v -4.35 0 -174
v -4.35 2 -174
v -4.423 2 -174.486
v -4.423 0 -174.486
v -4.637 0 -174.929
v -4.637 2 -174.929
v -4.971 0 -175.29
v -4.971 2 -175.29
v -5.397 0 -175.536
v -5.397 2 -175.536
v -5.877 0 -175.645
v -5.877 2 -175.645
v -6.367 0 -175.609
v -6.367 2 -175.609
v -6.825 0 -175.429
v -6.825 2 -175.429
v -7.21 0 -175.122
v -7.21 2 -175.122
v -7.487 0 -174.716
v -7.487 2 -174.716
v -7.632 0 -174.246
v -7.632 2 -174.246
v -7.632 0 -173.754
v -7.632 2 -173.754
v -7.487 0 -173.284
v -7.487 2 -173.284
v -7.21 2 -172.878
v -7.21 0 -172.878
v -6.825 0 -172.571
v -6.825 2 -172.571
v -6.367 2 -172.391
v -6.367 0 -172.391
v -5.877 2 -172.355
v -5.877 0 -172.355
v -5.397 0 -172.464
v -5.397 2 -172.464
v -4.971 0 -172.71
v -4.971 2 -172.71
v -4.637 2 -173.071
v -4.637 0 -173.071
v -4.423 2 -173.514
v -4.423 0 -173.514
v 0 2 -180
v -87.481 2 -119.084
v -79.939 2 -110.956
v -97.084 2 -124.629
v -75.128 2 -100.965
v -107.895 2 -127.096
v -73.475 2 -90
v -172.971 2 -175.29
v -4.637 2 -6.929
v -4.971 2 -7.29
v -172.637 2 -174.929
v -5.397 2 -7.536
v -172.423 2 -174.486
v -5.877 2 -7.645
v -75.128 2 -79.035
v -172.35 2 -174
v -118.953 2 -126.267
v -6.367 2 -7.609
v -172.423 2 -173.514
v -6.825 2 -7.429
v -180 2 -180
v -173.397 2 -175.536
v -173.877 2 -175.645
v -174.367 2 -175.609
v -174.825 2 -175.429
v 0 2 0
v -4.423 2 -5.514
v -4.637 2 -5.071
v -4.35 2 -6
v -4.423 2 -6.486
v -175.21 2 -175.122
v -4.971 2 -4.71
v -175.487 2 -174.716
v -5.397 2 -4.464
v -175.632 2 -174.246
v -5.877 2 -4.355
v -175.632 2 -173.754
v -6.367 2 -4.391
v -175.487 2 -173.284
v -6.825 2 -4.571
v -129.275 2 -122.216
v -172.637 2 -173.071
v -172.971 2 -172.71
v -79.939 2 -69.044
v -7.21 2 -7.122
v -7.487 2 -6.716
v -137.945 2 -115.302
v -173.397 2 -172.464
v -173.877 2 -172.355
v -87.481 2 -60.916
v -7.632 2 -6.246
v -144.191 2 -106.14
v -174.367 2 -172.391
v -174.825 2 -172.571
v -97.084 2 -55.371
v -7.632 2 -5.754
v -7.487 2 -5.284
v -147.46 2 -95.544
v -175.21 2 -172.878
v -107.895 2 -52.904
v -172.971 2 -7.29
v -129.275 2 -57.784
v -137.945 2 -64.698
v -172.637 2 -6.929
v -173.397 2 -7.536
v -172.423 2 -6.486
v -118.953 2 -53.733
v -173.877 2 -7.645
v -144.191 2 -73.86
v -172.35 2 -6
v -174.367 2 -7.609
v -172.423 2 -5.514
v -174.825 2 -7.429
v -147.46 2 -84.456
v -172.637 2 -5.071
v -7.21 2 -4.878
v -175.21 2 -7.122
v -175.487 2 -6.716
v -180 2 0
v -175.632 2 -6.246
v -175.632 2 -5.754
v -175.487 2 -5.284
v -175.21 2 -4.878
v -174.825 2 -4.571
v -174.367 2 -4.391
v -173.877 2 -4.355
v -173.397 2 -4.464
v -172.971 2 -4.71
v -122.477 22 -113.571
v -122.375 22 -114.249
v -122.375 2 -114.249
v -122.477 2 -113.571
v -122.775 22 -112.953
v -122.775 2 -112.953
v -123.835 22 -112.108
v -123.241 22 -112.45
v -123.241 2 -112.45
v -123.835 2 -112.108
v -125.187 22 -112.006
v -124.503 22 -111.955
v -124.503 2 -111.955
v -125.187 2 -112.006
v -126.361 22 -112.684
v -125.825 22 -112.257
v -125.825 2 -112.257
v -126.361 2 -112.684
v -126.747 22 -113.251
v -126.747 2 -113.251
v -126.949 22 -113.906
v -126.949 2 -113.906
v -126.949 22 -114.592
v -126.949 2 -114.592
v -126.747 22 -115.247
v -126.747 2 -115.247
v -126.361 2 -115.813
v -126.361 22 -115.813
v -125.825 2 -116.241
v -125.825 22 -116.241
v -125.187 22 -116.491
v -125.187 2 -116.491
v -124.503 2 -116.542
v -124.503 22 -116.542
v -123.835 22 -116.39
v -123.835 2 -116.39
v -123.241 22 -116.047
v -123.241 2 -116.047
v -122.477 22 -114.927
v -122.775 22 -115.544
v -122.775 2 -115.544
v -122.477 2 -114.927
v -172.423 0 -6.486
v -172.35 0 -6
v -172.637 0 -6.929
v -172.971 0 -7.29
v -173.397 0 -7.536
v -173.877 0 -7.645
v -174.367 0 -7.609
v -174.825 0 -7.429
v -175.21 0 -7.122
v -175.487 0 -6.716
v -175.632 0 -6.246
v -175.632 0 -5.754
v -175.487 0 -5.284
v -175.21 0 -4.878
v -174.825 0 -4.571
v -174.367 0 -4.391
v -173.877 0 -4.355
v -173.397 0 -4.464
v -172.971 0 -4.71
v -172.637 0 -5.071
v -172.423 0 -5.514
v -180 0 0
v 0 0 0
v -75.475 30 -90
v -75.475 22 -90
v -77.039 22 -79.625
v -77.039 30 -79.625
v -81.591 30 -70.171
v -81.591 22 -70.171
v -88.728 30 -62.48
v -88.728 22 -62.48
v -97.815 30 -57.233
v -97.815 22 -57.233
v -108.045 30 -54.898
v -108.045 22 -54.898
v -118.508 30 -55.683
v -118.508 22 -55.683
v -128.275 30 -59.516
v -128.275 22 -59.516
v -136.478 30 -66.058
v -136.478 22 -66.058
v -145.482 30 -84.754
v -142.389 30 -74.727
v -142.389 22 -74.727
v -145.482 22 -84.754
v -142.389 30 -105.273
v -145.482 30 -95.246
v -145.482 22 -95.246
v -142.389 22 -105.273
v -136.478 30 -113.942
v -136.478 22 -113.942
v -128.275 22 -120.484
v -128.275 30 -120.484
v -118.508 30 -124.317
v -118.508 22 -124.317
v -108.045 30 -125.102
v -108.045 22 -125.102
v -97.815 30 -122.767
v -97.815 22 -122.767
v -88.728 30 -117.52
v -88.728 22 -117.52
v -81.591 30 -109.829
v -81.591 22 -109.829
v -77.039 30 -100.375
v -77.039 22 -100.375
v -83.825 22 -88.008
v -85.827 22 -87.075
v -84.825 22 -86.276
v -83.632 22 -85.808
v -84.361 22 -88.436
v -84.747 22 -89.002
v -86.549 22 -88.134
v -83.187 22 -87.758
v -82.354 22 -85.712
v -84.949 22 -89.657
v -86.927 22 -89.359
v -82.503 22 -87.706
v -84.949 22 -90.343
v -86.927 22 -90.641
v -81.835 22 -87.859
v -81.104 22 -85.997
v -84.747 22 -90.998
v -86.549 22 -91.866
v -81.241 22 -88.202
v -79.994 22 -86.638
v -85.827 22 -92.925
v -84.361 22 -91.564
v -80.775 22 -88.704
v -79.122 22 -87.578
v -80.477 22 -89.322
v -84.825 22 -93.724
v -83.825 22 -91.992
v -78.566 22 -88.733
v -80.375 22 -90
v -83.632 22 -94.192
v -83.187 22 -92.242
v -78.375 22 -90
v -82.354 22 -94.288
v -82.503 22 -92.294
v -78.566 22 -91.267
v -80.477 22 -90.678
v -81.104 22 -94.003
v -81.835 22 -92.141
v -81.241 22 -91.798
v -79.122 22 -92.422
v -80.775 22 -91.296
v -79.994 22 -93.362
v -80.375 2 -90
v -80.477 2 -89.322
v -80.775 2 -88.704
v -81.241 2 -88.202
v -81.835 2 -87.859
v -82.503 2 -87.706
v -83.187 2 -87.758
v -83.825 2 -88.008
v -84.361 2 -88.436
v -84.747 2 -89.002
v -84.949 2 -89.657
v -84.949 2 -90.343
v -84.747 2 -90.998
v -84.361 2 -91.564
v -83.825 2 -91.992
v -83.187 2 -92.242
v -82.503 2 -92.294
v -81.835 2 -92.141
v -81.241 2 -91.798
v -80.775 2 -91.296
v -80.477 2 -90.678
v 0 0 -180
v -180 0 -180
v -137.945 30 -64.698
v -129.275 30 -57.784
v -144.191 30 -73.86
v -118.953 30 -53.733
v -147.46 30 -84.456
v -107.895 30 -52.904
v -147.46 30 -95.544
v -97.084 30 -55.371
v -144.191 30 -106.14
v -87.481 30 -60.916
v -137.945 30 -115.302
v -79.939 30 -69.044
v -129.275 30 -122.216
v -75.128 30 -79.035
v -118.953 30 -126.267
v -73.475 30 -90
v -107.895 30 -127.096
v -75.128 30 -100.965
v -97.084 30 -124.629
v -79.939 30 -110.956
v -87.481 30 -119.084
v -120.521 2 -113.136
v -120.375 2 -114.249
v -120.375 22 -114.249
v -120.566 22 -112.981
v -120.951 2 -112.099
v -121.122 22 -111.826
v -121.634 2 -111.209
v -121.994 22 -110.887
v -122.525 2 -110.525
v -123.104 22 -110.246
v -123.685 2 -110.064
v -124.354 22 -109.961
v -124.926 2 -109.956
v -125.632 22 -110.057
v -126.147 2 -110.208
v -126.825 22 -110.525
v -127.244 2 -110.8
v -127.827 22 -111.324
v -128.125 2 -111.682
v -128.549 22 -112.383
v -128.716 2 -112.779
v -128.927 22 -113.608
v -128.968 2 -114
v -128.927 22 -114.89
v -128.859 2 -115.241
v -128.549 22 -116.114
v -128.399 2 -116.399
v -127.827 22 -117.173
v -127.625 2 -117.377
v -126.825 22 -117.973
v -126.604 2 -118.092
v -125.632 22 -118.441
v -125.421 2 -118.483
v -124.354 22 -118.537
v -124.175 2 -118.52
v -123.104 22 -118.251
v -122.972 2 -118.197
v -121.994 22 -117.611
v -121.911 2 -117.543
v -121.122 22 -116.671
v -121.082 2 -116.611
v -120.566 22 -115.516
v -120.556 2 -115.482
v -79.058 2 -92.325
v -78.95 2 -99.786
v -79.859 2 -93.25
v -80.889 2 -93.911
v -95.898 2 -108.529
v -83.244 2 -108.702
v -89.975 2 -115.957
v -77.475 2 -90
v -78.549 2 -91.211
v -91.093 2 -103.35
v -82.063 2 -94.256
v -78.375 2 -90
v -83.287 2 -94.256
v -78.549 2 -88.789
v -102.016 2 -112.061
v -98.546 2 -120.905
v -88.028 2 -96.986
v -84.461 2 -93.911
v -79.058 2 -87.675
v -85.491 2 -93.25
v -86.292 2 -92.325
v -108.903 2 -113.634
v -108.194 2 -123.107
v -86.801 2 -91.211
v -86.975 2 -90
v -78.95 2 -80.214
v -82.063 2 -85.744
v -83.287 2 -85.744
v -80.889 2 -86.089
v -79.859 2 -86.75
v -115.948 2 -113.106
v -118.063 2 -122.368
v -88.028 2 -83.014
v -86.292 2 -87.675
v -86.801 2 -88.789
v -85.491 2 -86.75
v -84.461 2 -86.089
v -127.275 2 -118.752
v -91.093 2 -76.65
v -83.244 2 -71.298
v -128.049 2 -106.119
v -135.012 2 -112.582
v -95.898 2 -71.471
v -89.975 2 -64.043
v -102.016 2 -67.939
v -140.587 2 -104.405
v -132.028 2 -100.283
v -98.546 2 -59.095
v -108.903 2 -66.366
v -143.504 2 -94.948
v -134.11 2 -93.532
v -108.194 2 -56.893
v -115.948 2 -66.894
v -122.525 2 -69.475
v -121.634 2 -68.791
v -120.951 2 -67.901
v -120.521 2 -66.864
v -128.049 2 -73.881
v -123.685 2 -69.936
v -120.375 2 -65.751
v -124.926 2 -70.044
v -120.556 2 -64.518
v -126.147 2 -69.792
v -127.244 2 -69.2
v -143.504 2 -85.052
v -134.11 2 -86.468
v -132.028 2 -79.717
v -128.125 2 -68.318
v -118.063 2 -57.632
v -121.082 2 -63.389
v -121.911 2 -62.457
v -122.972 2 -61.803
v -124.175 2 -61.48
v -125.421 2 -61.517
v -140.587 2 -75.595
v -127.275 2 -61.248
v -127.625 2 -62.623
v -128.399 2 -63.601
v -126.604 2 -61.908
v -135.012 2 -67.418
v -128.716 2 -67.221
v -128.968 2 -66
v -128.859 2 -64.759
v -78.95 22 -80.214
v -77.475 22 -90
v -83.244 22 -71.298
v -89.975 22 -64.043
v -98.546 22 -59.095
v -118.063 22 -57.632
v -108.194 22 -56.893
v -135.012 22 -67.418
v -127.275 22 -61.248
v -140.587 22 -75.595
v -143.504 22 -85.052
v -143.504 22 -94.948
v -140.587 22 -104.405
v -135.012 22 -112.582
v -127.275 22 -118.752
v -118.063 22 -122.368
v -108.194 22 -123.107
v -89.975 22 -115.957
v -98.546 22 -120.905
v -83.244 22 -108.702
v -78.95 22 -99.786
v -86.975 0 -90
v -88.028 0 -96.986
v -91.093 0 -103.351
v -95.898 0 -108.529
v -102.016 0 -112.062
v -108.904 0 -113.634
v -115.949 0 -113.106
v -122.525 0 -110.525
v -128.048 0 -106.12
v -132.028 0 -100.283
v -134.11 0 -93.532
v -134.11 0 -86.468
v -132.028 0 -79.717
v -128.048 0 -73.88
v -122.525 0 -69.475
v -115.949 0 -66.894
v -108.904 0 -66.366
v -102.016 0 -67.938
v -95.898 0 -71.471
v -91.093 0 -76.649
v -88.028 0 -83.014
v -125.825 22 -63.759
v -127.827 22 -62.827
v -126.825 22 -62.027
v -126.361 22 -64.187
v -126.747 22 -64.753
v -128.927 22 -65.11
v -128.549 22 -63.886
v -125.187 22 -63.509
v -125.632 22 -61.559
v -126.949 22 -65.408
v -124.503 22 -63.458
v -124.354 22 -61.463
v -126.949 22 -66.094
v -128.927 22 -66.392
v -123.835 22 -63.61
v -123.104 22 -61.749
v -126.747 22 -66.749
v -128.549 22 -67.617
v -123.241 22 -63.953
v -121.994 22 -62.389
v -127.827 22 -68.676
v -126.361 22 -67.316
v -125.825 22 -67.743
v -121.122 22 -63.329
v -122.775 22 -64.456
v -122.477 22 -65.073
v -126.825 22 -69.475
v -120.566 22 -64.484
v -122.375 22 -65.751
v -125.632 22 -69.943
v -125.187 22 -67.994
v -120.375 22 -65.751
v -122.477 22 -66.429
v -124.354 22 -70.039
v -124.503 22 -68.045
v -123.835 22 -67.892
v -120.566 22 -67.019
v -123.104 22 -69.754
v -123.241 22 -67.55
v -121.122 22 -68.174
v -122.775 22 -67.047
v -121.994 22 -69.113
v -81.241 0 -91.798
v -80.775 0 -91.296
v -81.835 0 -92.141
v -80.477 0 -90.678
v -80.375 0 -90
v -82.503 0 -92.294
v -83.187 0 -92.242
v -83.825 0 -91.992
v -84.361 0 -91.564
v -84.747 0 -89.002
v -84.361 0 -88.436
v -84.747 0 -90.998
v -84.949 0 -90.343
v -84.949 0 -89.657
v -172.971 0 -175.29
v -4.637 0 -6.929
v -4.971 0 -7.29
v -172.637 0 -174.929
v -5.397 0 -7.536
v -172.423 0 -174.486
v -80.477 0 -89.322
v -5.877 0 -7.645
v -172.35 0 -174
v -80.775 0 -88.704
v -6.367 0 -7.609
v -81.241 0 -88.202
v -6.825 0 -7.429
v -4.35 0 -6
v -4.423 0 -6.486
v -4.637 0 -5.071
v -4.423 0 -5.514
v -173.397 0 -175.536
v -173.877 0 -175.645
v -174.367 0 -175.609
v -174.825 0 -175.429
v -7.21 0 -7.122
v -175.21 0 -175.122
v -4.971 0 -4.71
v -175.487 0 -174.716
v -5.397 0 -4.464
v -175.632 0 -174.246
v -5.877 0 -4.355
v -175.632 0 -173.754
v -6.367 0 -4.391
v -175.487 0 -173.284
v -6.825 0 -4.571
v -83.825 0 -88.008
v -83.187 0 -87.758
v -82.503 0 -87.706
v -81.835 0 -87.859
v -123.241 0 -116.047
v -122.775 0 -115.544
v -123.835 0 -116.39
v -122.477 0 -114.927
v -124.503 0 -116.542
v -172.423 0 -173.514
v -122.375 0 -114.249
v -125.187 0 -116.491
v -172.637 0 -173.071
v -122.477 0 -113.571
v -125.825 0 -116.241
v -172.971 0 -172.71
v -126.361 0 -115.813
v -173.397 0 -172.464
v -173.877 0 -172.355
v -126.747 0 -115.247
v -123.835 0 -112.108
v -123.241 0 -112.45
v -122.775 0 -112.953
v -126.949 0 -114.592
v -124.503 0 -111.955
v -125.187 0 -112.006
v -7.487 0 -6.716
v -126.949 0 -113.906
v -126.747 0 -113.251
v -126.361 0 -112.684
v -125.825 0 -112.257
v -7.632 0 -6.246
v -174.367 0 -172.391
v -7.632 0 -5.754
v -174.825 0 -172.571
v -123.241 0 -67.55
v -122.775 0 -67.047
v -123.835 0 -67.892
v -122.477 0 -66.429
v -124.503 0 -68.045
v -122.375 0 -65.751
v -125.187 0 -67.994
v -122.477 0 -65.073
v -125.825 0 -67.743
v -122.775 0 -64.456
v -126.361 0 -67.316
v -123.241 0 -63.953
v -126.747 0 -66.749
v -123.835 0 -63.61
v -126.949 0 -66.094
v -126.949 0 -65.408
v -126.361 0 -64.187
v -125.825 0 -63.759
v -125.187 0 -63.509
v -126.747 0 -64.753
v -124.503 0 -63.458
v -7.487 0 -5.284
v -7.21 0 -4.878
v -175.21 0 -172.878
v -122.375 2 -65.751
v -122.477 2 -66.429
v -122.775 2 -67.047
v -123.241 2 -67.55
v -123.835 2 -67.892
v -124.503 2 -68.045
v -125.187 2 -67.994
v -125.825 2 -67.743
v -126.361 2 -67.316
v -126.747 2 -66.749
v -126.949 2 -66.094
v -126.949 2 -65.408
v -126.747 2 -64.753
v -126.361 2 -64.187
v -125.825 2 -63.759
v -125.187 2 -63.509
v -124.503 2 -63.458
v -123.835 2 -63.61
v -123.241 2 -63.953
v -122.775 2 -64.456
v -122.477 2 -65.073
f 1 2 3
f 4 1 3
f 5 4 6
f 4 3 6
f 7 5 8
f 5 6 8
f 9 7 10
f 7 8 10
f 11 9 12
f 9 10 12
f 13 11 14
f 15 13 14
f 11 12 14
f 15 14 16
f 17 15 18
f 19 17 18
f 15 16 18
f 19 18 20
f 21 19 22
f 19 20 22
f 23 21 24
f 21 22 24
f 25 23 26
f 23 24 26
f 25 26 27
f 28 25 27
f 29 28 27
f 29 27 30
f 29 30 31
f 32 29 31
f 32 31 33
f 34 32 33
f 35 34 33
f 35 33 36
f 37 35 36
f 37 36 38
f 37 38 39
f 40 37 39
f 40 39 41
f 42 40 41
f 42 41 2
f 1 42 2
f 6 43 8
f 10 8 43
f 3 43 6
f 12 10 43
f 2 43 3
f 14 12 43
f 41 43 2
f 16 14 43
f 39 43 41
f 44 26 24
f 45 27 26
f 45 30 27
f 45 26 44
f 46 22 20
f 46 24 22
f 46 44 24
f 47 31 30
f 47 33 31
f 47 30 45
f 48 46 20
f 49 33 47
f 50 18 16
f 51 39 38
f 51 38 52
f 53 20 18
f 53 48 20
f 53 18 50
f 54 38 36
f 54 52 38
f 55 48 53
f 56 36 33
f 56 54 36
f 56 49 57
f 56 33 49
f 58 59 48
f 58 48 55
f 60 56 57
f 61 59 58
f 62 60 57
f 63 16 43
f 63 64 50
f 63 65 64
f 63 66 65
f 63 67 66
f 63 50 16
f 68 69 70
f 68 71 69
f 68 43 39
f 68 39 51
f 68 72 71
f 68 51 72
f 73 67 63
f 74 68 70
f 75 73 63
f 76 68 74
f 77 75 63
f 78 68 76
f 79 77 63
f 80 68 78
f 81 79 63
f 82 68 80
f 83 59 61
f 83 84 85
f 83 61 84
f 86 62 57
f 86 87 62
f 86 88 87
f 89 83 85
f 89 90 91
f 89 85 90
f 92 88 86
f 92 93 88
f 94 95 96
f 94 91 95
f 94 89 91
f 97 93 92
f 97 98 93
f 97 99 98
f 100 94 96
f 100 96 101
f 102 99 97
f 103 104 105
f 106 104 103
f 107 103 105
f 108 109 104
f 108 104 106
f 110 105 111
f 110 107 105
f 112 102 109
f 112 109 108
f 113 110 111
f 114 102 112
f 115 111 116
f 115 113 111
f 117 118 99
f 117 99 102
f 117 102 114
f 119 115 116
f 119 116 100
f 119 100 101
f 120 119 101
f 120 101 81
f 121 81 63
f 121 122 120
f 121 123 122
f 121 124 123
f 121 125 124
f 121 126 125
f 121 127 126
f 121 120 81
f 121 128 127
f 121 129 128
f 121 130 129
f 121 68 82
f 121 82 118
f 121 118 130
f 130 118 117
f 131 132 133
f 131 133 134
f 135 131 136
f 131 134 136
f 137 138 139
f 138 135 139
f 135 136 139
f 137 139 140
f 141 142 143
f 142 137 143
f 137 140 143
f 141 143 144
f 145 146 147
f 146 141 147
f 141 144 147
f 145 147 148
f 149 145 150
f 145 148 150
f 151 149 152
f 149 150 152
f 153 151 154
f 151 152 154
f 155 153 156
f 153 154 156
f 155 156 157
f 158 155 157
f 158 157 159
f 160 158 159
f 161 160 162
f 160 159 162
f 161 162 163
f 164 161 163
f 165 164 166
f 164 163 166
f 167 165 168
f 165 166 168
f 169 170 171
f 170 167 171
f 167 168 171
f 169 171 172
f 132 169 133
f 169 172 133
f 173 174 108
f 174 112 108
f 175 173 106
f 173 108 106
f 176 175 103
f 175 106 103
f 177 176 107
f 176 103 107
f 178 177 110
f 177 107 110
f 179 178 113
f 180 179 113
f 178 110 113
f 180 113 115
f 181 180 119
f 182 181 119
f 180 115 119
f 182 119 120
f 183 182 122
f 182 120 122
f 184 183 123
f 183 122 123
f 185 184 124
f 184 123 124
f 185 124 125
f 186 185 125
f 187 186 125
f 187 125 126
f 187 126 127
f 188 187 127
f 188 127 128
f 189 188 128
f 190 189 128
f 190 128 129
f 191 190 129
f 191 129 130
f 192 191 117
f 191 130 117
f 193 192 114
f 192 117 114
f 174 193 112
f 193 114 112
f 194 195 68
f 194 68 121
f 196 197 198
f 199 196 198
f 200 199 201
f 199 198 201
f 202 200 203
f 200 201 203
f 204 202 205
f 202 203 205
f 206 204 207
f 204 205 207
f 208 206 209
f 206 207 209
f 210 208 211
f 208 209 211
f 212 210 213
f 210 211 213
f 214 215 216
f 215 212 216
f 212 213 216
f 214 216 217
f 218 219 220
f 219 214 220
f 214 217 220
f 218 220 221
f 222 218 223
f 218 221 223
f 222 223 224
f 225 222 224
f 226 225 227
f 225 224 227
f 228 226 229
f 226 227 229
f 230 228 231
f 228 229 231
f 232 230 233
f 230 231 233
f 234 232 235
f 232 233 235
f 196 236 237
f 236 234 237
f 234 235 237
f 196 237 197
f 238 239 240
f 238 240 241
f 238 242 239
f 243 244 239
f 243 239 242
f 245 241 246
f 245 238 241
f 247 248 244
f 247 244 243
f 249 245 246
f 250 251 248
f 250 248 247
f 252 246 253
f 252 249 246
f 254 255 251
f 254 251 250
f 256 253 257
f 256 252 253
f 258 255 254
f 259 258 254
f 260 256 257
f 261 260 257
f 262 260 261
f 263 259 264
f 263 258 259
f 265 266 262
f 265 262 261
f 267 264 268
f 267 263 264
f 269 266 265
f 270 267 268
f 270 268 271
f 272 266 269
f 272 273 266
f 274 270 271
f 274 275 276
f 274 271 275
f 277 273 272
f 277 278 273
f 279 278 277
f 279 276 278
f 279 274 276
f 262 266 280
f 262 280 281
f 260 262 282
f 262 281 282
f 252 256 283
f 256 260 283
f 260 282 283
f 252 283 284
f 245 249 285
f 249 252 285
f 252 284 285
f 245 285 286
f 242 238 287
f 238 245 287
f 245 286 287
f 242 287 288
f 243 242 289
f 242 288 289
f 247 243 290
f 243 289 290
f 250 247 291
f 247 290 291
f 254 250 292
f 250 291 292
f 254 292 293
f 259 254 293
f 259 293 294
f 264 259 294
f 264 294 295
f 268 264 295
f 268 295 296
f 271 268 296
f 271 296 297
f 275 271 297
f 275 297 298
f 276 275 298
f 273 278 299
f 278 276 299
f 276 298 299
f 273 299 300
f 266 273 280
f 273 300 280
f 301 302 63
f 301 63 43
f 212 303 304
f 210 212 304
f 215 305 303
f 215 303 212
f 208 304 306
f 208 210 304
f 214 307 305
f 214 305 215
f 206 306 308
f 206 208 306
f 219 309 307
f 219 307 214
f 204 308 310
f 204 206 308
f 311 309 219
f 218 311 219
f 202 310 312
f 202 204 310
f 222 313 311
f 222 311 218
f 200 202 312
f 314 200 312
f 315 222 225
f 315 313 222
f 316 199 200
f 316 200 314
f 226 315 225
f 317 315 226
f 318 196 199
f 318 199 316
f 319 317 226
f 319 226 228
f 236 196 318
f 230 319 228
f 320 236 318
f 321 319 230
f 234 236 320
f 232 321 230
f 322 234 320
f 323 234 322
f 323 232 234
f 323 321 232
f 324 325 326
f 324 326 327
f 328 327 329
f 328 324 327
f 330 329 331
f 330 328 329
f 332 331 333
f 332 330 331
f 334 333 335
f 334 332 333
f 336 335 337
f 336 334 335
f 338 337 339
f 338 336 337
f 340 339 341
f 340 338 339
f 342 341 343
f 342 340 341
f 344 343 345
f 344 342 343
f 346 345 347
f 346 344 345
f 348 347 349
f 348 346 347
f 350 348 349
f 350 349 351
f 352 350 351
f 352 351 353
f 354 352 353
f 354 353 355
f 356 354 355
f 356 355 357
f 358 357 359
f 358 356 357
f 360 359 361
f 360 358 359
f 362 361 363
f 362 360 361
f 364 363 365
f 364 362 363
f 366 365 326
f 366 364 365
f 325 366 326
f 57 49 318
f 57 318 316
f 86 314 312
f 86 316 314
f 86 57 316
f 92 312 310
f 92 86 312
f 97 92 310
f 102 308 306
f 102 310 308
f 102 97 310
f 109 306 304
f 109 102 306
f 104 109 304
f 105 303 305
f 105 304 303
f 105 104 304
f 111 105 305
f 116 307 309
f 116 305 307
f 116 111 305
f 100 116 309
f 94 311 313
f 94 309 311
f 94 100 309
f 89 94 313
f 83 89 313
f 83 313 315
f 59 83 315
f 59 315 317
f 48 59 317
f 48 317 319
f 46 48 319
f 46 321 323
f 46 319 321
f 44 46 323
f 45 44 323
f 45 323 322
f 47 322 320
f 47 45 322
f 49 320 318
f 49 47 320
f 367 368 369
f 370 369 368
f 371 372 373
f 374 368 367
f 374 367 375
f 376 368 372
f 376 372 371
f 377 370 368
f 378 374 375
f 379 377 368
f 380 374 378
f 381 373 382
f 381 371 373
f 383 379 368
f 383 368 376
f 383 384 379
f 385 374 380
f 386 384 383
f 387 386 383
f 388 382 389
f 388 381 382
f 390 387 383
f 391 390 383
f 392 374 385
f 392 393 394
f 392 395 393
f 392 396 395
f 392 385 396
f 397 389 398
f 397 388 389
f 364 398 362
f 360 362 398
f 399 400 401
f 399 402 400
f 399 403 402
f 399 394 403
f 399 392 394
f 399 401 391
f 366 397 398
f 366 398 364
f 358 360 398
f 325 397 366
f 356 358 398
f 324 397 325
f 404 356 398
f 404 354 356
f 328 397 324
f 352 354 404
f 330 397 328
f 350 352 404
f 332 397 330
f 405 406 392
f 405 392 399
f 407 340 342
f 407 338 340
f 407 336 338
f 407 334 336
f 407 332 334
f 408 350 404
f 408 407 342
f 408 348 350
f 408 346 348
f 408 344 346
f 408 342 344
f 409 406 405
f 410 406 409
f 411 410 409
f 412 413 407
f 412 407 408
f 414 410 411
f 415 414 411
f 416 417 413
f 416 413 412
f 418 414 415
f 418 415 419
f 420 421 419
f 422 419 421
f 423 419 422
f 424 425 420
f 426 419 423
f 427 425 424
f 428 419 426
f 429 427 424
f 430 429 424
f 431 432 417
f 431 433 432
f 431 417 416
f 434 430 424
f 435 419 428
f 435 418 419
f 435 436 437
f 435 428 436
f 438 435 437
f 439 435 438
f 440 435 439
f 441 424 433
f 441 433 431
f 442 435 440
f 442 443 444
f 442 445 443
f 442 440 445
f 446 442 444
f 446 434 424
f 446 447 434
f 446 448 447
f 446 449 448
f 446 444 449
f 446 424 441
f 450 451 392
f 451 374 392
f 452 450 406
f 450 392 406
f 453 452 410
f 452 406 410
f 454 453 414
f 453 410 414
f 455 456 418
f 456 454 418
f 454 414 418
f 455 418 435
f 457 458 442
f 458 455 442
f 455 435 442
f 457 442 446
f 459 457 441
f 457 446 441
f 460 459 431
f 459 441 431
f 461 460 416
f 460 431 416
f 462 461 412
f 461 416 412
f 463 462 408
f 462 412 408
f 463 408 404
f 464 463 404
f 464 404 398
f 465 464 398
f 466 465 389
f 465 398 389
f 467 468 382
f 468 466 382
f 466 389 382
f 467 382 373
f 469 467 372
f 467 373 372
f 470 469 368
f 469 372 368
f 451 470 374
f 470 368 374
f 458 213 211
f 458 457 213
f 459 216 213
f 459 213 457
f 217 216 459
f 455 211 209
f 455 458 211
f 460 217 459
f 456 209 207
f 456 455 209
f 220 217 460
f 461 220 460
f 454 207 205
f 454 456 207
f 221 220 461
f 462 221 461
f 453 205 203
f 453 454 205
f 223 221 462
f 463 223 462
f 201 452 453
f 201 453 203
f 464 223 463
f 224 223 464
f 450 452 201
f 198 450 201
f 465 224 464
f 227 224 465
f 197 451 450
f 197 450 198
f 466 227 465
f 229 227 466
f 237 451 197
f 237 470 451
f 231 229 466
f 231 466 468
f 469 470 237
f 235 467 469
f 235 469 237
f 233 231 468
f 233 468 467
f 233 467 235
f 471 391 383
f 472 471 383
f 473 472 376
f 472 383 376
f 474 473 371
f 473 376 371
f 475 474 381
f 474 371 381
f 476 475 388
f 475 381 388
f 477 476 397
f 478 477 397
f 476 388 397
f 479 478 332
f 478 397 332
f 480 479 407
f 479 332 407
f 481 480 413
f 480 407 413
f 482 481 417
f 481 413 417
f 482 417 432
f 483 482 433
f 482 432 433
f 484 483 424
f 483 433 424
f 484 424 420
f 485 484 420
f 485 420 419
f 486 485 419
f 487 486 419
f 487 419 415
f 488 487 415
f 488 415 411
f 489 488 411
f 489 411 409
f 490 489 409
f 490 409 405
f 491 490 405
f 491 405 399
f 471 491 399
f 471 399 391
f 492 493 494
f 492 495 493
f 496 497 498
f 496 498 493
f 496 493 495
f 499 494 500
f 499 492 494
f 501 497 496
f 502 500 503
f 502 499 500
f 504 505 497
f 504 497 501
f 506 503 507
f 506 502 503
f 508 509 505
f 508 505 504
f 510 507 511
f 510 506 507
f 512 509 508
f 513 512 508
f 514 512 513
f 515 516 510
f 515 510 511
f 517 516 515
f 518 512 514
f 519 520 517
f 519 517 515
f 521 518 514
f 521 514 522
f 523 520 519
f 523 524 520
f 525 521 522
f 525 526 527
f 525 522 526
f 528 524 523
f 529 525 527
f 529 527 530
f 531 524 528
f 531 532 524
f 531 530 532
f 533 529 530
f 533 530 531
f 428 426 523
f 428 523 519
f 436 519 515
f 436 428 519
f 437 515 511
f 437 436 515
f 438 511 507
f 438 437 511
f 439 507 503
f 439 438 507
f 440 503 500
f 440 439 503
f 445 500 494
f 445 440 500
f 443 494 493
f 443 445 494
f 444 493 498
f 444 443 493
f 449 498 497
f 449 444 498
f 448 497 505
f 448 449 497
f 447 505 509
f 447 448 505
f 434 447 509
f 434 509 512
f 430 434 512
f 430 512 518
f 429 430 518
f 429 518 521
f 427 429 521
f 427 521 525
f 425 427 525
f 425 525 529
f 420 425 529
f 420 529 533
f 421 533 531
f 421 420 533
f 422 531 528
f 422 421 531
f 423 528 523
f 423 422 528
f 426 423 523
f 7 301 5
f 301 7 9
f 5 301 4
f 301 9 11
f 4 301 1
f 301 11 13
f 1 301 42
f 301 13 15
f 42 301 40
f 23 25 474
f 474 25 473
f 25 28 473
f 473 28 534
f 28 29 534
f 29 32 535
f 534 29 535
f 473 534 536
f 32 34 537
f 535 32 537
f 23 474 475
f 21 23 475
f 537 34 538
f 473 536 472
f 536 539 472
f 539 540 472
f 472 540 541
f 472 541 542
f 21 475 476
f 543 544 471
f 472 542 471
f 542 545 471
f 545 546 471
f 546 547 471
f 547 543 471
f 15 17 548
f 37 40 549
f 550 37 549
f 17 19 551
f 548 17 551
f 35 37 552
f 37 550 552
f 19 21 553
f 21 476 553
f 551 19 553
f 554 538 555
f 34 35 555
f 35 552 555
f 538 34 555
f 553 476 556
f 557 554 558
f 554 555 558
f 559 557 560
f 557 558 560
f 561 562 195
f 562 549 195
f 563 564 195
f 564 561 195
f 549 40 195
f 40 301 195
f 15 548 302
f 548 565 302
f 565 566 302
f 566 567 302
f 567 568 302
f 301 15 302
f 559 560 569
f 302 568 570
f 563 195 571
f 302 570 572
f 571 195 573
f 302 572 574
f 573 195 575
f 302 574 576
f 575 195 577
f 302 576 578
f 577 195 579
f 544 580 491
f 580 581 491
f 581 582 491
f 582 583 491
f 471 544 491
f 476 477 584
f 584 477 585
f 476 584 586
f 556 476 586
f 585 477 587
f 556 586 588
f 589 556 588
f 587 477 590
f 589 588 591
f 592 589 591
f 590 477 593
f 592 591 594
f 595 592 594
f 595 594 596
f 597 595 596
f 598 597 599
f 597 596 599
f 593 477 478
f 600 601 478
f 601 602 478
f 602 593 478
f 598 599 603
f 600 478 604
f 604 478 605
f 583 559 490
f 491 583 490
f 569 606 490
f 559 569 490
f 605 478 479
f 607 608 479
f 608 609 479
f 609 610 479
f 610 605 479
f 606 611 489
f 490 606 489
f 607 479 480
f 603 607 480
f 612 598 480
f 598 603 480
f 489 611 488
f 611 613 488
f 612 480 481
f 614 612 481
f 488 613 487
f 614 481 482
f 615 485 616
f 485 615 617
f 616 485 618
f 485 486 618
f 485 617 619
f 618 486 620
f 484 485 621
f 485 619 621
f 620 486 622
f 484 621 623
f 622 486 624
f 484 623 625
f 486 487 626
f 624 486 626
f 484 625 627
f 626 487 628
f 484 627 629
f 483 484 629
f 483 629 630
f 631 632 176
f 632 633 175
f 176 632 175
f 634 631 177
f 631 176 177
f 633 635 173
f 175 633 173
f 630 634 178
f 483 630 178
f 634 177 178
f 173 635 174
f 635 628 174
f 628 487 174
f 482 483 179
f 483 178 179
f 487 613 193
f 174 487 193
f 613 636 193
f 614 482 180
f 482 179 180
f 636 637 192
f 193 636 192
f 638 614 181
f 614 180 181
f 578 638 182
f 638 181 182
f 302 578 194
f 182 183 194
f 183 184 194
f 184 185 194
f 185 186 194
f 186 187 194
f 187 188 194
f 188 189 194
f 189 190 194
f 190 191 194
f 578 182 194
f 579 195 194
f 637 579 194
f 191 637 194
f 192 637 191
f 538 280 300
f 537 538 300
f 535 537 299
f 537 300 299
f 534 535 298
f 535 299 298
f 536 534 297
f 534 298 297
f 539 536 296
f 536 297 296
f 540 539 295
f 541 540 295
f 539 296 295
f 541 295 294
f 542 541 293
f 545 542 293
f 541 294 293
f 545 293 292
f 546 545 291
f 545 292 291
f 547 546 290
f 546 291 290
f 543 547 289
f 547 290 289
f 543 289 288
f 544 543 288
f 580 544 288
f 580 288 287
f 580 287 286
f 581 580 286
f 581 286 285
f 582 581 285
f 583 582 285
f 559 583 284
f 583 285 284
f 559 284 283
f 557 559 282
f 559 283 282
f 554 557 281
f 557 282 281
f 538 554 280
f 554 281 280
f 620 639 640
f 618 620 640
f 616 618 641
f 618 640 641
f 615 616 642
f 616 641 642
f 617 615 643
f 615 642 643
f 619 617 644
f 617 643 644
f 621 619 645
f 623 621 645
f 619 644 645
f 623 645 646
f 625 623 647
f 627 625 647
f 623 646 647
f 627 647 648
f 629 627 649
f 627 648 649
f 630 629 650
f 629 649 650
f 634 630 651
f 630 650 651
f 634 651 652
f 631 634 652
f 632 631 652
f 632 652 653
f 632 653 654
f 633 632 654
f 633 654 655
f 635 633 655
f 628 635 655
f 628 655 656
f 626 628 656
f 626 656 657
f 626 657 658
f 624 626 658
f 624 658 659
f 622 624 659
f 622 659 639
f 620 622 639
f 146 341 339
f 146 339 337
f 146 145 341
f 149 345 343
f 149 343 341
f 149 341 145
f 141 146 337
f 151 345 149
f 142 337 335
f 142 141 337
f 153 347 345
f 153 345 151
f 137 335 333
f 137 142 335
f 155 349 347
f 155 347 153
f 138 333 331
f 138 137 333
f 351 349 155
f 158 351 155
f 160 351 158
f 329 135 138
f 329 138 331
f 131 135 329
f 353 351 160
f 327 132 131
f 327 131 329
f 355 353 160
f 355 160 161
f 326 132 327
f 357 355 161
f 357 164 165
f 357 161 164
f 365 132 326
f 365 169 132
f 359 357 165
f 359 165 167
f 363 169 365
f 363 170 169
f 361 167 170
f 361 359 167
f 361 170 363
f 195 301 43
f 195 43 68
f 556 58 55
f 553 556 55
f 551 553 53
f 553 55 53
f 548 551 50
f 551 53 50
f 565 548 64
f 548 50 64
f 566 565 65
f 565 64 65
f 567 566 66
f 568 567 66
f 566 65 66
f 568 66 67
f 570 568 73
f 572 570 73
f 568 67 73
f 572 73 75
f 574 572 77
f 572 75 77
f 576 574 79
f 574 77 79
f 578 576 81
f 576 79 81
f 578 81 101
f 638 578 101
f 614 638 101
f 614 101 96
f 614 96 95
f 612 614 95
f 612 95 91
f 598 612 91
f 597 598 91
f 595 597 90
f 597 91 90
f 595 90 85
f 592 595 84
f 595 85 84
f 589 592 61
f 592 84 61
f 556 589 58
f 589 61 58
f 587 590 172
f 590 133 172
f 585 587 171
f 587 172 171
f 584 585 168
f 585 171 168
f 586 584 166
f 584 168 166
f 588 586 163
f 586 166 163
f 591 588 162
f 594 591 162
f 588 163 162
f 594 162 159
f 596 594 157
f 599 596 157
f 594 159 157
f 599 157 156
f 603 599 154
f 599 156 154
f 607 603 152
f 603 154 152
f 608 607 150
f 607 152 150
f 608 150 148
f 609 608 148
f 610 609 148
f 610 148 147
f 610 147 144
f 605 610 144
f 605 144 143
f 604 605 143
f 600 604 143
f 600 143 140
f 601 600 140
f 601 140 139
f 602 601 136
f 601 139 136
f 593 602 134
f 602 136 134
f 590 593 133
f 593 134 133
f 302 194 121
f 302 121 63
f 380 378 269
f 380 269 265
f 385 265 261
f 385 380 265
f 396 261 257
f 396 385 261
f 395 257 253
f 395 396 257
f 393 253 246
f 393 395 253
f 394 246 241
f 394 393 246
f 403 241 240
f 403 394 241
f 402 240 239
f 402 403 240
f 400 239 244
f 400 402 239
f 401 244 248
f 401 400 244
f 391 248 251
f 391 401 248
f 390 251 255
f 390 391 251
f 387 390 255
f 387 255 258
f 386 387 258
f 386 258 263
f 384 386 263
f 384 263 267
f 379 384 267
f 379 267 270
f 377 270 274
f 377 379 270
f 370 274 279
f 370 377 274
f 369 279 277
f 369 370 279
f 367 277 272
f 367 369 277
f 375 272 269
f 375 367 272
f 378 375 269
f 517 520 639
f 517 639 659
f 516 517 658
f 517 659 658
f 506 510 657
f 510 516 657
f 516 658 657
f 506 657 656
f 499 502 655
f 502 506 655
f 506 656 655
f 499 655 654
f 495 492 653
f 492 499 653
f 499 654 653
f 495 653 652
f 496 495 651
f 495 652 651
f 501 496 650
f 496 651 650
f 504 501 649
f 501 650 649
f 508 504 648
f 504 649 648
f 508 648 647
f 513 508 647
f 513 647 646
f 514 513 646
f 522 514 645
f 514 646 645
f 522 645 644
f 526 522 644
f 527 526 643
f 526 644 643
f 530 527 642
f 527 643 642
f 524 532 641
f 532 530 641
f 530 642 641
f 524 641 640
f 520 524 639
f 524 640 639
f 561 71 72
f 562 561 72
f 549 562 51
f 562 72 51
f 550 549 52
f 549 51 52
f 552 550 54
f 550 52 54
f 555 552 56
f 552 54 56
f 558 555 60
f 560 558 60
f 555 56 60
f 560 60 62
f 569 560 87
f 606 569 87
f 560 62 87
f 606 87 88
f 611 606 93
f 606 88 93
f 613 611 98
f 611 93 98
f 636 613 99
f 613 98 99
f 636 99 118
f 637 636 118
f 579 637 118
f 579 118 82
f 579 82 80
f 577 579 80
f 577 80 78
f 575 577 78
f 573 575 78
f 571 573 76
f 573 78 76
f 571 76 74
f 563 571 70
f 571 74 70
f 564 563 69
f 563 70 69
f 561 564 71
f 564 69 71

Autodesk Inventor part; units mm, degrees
ref_plane "YZ Plane" through (0, 0, 0) normal (1, 0, 0) x (0, 1, 0)
ref_plane "XZ Plane" through (0, 0, 0) normal (0, 1, 0) x (-1, 0, 0)
ref_plane "XY Plane" through (0, 0, 0) normal (0, 0, 1) x (1, 0, 0)
sketch "Sketch1" plane through (0, 0, 0) normal (0, 1, 0) x (-1, 0, 0)
  line L0 (0, 0) -> (180, 0)
  line L1 (180, 0) -> (180, -180)
  line L2 (180, -180) -> (0, -180)
  line L3 (0, -180) -> (0, 0)
  dimension "d0" = 180
  dimension "d1" = 180
extrude "Extrusion1" add sketch "Sketch1" along normal blind 2
sketch "Sketch3" plane through (0, 2, 0) normal (0, 1, 0) x (1, 0, 0)
  circle A0 centre (-174, 6) radius 1.65
  circle A1 centre (-174, 174) radius 1.65
  circle A2 centre (-6, 174) radius 1.65
  circle A3 centre (-6, 6) radius 1.65
  point P0 (0, 0)
  dimension "d9" = 3.3
  dimension "d10" = 3.3
  dimension "d11" = 3.3
  dimension "d12" = 3.3
extrude "Extrusion3" cut sketch "Sketch3" against normal through all
sketch "Sketch10" plane through (0, 2, 0) normal (0, 1, 0) x (1, 0, 0)
  line L0 (0, 180) -> (-180, 180)
  circle A0 centre (-110.675, 90) radius 35.2
  circle A1 centre (-110.675, 90) radius 37.2
  circle A2 centre (-110.675, 90) radius 28 construction
  line L1 (-110.675, 90) -> (-73.475, 90) construction
  line L2 (-110.675, 90) -> (-129.275, 122.216145) construction
  line L3 (-90.675, 90) -> (-53.475, 90) construction
  line L4 (-110.675, 90) -> (-129.275, 57.783855) construction
  line L5 (-90.675, 90) -> (-53.475, 90) construction
  circle A3 centre (-124.675, 114.248711) radius 2.3
  circle A4 centre (-124.675, 114.248711) radius 4.3
  circle A5 centre (-124.675, 65.751289) radius 2.3
  circle A6 centre (-124.675, 65.751289) radius 4.3
  circle A7 centre (-82.675, 90) radius 2.3
  circle A8 centre (-82.675, 90) radius 4.3
  circle A9 centre (-110.675, 90) radius 33.2
  circle A10 centre (-110.675, 90) radius 23.7
  point P0 (0, 0)
  dimension "d68" = 70.4
  dimension "d69" = 74.4
  dimension "d70" = 56
  dimension "d71" = 120
  dimension "d72" = 120
  dimension "d73" = 4.6
  dimension "d74" = 8.6
  dimension "d75" = 4.6
  dimension "d76" = 8.6
  dimension "d77" = 4.6
  dimension "d78" = 8.6
  dimension "d79" = 66.4
  dimension "d88" = 47.4
sketch "Sketch10 outline for Extrusion11" plane through (0, 2, 0) normal (0, 1, 0) x (1, 0, 0)
  circle A0 centre (-110.675, 90) radius 35.2
  circle A1 centre (-110.675, 90) radius 33.2
  circle A2 centre (-82.675, 90) radius 4.3
  circle A3 centre (-82.675, 90) radius 2.3
  circle A4 centre (-124.675, 65.751289) radius 4.3
  circle A5 centre (-124.675, 65.751289) radius 2.3
  circle A6 centre (-124.675, 114.248711) radius 4.3
  circle A7 centre (-124.675, 114.248711) radius 2.3
extrude "Extrusion11" add sketch "Sketch10 outline for Extrusion11" along normal blind 20
sketch "Sketch10 outline for Extrusion12" plane through (0, 2, 0) normal (0, 1, 0) x (1, 0, 0)
  circle A0 centre (-110.675, 90) radius 37.2
  circle A1 centre (-110.675, 90) radius 35.2
extrude "Extrusion12" add sketch "Sketch10 outline for Extrusion12" along normal blind 28
sketch "Sketch10 outline for Extrusion13" plane through (0, 2, 0) normal (0, 1, 0) x (1, 0, 0)
  circle A0 centre (-110.675, 90) radius 23.7
extrude "Extrusion13" cut sketch "Sketch10 outline for Extrusion13" against normal through all
sketch "Sketch10 outline for Extrusion14" plane through (0, 2, 0) normal (0, 1, 0) x (1, 0, 0)
  circle A0 centre (-124.675, 114.248711) radius 2.3
  circle A1 centre (-124.675, 65.751289) radius 2.3
  circle A2 centre (-82.675, 90) radius 2.3
extrude "Extrusion14" cut sketch "Sketch10 outline for Extrusion14" against normal through all
properties part number "top plate"
